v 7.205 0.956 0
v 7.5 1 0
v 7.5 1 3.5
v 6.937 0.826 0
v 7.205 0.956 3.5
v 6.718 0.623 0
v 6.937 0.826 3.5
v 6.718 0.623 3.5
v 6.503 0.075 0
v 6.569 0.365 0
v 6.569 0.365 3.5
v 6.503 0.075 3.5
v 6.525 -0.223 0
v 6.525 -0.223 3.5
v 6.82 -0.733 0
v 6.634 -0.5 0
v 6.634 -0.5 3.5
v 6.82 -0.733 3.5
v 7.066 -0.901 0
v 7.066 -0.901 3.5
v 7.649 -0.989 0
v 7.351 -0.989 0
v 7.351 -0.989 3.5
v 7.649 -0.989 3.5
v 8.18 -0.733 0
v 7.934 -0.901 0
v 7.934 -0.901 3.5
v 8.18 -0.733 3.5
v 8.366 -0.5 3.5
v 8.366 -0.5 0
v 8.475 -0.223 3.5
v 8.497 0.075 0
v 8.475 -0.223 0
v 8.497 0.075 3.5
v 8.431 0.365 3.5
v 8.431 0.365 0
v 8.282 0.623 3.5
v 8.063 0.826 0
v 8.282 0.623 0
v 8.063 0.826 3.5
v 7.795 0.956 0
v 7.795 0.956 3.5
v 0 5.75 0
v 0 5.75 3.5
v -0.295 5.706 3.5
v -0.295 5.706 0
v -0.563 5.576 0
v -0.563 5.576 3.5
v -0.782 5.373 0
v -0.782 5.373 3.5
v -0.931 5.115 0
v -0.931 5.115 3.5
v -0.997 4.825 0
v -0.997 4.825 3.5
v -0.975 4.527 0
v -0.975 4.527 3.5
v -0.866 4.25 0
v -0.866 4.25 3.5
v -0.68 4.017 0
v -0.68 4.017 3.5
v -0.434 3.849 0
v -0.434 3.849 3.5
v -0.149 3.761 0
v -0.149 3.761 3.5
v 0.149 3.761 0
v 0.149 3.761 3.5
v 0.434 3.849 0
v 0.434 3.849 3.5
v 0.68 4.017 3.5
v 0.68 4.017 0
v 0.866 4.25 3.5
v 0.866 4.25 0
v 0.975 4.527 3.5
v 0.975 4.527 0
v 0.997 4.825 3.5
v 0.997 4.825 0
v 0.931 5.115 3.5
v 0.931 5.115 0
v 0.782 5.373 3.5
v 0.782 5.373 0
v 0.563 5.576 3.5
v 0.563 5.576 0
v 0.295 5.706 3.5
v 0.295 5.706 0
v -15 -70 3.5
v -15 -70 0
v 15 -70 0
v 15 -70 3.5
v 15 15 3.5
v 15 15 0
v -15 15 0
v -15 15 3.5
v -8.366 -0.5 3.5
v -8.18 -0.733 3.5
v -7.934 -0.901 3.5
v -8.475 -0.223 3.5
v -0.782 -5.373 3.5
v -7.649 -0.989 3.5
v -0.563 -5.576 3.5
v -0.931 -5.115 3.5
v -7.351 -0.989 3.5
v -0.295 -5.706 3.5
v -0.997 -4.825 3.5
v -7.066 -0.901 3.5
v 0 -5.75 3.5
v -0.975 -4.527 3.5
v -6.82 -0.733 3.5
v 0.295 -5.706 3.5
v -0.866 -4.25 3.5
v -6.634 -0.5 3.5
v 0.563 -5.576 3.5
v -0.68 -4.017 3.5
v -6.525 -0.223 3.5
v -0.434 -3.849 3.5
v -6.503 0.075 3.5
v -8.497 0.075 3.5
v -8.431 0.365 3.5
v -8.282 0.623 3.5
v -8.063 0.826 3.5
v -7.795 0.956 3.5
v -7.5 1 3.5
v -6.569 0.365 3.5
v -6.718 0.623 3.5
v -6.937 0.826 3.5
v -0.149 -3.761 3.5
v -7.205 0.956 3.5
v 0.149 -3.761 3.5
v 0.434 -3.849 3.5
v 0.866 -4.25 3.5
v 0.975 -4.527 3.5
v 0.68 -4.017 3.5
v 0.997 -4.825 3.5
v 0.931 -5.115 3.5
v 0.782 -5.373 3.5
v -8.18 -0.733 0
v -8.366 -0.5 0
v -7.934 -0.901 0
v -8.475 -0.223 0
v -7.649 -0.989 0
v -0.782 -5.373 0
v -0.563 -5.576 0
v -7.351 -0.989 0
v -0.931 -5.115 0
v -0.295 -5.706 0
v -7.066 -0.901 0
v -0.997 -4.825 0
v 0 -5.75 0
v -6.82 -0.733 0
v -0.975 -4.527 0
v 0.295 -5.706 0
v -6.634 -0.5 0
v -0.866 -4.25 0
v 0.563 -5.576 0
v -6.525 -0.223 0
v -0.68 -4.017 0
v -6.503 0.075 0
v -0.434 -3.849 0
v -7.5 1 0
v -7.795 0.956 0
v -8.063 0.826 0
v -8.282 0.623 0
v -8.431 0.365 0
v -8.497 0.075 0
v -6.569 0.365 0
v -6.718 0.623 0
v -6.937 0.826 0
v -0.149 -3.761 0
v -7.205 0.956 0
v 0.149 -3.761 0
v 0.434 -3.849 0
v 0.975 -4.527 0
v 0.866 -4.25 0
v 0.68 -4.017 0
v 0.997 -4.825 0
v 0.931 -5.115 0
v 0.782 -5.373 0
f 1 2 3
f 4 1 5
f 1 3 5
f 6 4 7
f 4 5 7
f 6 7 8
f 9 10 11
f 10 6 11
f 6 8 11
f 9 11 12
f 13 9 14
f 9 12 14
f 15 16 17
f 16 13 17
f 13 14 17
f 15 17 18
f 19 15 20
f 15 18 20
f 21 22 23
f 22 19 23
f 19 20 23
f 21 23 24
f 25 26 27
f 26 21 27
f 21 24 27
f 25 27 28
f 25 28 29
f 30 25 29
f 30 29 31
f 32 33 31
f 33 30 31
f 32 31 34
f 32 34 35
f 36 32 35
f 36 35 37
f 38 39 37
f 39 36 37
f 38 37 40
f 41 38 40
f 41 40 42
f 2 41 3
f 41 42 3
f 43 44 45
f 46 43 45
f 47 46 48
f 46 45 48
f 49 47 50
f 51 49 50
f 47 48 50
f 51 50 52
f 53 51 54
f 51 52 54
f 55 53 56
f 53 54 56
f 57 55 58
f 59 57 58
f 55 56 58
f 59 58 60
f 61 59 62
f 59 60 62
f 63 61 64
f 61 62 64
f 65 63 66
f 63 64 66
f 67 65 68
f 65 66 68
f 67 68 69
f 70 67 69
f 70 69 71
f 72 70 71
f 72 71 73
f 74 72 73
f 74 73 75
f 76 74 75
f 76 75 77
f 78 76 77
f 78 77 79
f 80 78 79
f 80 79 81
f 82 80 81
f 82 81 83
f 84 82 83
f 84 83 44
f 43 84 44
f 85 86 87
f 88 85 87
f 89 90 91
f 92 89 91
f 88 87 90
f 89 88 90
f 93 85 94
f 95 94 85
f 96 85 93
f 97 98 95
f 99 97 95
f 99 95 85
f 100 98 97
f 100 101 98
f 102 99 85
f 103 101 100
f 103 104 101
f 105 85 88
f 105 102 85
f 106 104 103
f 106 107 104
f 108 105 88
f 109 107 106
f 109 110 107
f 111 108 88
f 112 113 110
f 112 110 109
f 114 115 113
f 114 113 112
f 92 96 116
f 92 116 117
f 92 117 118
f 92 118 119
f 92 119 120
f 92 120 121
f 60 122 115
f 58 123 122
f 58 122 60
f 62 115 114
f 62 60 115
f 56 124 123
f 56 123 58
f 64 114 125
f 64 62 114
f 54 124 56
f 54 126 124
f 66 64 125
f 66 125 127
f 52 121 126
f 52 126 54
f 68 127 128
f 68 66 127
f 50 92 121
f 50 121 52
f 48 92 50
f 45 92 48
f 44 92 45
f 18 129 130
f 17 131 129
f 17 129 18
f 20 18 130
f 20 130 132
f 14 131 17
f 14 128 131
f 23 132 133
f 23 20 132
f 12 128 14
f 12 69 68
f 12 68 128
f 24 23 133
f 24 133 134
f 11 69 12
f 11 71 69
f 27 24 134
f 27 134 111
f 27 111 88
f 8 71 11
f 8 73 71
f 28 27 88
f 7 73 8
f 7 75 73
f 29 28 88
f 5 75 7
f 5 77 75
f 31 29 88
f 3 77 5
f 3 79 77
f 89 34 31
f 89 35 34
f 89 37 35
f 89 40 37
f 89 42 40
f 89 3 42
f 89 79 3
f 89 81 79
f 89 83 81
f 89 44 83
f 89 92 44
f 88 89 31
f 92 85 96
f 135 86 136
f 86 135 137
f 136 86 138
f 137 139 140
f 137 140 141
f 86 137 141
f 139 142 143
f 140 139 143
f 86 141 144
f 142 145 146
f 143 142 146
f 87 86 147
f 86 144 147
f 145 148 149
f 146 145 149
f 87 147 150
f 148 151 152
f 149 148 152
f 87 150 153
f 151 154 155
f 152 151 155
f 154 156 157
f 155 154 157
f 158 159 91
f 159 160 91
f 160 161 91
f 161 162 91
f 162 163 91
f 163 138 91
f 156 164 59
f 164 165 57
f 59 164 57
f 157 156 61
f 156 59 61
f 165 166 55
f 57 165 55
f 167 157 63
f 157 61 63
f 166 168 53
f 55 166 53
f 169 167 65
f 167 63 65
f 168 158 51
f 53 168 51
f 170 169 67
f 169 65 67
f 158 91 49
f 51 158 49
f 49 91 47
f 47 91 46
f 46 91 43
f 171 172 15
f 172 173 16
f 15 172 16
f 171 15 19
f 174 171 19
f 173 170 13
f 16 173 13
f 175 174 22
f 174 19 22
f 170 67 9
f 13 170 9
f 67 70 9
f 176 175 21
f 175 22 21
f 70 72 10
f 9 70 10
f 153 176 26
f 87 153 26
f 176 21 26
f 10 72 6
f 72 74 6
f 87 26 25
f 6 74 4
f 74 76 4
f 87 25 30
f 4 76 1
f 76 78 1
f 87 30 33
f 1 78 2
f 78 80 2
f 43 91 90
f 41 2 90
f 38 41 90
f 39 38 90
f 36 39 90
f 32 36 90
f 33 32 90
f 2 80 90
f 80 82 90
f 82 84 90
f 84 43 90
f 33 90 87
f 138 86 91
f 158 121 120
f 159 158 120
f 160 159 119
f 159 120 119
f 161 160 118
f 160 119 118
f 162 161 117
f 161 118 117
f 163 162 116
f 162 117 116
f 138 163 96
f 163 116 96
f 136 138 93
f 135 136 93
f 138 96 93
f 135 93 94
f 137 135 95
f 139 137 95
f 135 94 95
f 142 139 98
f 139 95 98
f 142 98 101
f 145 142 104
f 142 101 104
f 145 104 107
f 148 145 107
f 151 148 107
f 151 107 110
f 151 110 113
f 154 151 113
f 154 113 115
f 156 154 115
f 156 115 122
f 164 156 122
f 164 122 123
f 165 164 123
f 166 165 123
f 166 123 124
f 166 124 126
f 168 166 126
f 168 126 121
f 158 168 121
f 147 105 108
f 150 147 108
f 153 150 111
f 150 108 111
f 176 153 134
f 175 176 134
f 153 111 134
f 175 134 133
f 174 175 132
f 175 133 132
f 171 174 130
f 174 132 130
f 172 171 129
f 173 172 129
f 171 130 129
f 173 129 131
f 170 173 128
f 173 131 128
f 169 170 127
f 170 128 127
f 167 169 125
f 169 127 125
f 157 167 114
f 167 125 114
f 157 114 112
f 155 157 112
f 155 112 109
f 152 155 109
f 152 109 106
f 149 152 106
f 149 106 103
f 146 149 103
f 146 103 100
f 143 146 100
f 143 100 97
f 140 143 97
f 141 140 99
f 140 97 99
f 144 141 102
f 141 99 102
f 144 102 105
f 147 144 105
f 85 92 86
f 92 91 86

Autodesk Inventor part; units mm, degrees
ref_plane "YZ Plane" through (0, 0, 0) normal (1, 0, 0) x (0, 1, 0)
ref_plane "XZ Plane" through (0, 0, 0) normal (0, 1, 0) x (-1, 0, 0)
ref_plane "XY Plane" through (0, 0, 0) normal (0, 0, 1) x (1, 0, 0)
sketch "Sketch1" plane through (0, 0, 0) normal (0, 0, 1) x (1, 0, 0)
  line L0 (0, 0) -> (-7.5, 0) construction
  line L1 (0, 0) -> (0, 4.75) construction
  line L2 (0, 0) -> (0, 15)
  line L3 (0, 15) -> (-15, 15)
  line L4 (-15, 15) -> (-15, -70)
  line L5 (-15, -70) -> (0, -70)
  line L6 (0, -70) -> (0, 0)
  dimension "d10" = 7.5
  dimension "d14" = 4.75
  dimension "d17" = 15
  dimension "d18" = 15
  dimension "d19" = 70
extrude "Extrusion1" add sketch "Sketch1" along normal blind 3.5
hole "Hole1" at (0, 4.75, 0) at (-7.5, 0, 0) direction (0, 0, 1) diameter 2 end through all
mirror "Mirror2" about plane through (0, 0, 0) normal (0, 1, 0) of "Hole1"
mirror "Mirror1" about plane through (0, 0, 0) normal (1, 0, 0)
properties part number "segment3a" material "Plywood, Finish"
